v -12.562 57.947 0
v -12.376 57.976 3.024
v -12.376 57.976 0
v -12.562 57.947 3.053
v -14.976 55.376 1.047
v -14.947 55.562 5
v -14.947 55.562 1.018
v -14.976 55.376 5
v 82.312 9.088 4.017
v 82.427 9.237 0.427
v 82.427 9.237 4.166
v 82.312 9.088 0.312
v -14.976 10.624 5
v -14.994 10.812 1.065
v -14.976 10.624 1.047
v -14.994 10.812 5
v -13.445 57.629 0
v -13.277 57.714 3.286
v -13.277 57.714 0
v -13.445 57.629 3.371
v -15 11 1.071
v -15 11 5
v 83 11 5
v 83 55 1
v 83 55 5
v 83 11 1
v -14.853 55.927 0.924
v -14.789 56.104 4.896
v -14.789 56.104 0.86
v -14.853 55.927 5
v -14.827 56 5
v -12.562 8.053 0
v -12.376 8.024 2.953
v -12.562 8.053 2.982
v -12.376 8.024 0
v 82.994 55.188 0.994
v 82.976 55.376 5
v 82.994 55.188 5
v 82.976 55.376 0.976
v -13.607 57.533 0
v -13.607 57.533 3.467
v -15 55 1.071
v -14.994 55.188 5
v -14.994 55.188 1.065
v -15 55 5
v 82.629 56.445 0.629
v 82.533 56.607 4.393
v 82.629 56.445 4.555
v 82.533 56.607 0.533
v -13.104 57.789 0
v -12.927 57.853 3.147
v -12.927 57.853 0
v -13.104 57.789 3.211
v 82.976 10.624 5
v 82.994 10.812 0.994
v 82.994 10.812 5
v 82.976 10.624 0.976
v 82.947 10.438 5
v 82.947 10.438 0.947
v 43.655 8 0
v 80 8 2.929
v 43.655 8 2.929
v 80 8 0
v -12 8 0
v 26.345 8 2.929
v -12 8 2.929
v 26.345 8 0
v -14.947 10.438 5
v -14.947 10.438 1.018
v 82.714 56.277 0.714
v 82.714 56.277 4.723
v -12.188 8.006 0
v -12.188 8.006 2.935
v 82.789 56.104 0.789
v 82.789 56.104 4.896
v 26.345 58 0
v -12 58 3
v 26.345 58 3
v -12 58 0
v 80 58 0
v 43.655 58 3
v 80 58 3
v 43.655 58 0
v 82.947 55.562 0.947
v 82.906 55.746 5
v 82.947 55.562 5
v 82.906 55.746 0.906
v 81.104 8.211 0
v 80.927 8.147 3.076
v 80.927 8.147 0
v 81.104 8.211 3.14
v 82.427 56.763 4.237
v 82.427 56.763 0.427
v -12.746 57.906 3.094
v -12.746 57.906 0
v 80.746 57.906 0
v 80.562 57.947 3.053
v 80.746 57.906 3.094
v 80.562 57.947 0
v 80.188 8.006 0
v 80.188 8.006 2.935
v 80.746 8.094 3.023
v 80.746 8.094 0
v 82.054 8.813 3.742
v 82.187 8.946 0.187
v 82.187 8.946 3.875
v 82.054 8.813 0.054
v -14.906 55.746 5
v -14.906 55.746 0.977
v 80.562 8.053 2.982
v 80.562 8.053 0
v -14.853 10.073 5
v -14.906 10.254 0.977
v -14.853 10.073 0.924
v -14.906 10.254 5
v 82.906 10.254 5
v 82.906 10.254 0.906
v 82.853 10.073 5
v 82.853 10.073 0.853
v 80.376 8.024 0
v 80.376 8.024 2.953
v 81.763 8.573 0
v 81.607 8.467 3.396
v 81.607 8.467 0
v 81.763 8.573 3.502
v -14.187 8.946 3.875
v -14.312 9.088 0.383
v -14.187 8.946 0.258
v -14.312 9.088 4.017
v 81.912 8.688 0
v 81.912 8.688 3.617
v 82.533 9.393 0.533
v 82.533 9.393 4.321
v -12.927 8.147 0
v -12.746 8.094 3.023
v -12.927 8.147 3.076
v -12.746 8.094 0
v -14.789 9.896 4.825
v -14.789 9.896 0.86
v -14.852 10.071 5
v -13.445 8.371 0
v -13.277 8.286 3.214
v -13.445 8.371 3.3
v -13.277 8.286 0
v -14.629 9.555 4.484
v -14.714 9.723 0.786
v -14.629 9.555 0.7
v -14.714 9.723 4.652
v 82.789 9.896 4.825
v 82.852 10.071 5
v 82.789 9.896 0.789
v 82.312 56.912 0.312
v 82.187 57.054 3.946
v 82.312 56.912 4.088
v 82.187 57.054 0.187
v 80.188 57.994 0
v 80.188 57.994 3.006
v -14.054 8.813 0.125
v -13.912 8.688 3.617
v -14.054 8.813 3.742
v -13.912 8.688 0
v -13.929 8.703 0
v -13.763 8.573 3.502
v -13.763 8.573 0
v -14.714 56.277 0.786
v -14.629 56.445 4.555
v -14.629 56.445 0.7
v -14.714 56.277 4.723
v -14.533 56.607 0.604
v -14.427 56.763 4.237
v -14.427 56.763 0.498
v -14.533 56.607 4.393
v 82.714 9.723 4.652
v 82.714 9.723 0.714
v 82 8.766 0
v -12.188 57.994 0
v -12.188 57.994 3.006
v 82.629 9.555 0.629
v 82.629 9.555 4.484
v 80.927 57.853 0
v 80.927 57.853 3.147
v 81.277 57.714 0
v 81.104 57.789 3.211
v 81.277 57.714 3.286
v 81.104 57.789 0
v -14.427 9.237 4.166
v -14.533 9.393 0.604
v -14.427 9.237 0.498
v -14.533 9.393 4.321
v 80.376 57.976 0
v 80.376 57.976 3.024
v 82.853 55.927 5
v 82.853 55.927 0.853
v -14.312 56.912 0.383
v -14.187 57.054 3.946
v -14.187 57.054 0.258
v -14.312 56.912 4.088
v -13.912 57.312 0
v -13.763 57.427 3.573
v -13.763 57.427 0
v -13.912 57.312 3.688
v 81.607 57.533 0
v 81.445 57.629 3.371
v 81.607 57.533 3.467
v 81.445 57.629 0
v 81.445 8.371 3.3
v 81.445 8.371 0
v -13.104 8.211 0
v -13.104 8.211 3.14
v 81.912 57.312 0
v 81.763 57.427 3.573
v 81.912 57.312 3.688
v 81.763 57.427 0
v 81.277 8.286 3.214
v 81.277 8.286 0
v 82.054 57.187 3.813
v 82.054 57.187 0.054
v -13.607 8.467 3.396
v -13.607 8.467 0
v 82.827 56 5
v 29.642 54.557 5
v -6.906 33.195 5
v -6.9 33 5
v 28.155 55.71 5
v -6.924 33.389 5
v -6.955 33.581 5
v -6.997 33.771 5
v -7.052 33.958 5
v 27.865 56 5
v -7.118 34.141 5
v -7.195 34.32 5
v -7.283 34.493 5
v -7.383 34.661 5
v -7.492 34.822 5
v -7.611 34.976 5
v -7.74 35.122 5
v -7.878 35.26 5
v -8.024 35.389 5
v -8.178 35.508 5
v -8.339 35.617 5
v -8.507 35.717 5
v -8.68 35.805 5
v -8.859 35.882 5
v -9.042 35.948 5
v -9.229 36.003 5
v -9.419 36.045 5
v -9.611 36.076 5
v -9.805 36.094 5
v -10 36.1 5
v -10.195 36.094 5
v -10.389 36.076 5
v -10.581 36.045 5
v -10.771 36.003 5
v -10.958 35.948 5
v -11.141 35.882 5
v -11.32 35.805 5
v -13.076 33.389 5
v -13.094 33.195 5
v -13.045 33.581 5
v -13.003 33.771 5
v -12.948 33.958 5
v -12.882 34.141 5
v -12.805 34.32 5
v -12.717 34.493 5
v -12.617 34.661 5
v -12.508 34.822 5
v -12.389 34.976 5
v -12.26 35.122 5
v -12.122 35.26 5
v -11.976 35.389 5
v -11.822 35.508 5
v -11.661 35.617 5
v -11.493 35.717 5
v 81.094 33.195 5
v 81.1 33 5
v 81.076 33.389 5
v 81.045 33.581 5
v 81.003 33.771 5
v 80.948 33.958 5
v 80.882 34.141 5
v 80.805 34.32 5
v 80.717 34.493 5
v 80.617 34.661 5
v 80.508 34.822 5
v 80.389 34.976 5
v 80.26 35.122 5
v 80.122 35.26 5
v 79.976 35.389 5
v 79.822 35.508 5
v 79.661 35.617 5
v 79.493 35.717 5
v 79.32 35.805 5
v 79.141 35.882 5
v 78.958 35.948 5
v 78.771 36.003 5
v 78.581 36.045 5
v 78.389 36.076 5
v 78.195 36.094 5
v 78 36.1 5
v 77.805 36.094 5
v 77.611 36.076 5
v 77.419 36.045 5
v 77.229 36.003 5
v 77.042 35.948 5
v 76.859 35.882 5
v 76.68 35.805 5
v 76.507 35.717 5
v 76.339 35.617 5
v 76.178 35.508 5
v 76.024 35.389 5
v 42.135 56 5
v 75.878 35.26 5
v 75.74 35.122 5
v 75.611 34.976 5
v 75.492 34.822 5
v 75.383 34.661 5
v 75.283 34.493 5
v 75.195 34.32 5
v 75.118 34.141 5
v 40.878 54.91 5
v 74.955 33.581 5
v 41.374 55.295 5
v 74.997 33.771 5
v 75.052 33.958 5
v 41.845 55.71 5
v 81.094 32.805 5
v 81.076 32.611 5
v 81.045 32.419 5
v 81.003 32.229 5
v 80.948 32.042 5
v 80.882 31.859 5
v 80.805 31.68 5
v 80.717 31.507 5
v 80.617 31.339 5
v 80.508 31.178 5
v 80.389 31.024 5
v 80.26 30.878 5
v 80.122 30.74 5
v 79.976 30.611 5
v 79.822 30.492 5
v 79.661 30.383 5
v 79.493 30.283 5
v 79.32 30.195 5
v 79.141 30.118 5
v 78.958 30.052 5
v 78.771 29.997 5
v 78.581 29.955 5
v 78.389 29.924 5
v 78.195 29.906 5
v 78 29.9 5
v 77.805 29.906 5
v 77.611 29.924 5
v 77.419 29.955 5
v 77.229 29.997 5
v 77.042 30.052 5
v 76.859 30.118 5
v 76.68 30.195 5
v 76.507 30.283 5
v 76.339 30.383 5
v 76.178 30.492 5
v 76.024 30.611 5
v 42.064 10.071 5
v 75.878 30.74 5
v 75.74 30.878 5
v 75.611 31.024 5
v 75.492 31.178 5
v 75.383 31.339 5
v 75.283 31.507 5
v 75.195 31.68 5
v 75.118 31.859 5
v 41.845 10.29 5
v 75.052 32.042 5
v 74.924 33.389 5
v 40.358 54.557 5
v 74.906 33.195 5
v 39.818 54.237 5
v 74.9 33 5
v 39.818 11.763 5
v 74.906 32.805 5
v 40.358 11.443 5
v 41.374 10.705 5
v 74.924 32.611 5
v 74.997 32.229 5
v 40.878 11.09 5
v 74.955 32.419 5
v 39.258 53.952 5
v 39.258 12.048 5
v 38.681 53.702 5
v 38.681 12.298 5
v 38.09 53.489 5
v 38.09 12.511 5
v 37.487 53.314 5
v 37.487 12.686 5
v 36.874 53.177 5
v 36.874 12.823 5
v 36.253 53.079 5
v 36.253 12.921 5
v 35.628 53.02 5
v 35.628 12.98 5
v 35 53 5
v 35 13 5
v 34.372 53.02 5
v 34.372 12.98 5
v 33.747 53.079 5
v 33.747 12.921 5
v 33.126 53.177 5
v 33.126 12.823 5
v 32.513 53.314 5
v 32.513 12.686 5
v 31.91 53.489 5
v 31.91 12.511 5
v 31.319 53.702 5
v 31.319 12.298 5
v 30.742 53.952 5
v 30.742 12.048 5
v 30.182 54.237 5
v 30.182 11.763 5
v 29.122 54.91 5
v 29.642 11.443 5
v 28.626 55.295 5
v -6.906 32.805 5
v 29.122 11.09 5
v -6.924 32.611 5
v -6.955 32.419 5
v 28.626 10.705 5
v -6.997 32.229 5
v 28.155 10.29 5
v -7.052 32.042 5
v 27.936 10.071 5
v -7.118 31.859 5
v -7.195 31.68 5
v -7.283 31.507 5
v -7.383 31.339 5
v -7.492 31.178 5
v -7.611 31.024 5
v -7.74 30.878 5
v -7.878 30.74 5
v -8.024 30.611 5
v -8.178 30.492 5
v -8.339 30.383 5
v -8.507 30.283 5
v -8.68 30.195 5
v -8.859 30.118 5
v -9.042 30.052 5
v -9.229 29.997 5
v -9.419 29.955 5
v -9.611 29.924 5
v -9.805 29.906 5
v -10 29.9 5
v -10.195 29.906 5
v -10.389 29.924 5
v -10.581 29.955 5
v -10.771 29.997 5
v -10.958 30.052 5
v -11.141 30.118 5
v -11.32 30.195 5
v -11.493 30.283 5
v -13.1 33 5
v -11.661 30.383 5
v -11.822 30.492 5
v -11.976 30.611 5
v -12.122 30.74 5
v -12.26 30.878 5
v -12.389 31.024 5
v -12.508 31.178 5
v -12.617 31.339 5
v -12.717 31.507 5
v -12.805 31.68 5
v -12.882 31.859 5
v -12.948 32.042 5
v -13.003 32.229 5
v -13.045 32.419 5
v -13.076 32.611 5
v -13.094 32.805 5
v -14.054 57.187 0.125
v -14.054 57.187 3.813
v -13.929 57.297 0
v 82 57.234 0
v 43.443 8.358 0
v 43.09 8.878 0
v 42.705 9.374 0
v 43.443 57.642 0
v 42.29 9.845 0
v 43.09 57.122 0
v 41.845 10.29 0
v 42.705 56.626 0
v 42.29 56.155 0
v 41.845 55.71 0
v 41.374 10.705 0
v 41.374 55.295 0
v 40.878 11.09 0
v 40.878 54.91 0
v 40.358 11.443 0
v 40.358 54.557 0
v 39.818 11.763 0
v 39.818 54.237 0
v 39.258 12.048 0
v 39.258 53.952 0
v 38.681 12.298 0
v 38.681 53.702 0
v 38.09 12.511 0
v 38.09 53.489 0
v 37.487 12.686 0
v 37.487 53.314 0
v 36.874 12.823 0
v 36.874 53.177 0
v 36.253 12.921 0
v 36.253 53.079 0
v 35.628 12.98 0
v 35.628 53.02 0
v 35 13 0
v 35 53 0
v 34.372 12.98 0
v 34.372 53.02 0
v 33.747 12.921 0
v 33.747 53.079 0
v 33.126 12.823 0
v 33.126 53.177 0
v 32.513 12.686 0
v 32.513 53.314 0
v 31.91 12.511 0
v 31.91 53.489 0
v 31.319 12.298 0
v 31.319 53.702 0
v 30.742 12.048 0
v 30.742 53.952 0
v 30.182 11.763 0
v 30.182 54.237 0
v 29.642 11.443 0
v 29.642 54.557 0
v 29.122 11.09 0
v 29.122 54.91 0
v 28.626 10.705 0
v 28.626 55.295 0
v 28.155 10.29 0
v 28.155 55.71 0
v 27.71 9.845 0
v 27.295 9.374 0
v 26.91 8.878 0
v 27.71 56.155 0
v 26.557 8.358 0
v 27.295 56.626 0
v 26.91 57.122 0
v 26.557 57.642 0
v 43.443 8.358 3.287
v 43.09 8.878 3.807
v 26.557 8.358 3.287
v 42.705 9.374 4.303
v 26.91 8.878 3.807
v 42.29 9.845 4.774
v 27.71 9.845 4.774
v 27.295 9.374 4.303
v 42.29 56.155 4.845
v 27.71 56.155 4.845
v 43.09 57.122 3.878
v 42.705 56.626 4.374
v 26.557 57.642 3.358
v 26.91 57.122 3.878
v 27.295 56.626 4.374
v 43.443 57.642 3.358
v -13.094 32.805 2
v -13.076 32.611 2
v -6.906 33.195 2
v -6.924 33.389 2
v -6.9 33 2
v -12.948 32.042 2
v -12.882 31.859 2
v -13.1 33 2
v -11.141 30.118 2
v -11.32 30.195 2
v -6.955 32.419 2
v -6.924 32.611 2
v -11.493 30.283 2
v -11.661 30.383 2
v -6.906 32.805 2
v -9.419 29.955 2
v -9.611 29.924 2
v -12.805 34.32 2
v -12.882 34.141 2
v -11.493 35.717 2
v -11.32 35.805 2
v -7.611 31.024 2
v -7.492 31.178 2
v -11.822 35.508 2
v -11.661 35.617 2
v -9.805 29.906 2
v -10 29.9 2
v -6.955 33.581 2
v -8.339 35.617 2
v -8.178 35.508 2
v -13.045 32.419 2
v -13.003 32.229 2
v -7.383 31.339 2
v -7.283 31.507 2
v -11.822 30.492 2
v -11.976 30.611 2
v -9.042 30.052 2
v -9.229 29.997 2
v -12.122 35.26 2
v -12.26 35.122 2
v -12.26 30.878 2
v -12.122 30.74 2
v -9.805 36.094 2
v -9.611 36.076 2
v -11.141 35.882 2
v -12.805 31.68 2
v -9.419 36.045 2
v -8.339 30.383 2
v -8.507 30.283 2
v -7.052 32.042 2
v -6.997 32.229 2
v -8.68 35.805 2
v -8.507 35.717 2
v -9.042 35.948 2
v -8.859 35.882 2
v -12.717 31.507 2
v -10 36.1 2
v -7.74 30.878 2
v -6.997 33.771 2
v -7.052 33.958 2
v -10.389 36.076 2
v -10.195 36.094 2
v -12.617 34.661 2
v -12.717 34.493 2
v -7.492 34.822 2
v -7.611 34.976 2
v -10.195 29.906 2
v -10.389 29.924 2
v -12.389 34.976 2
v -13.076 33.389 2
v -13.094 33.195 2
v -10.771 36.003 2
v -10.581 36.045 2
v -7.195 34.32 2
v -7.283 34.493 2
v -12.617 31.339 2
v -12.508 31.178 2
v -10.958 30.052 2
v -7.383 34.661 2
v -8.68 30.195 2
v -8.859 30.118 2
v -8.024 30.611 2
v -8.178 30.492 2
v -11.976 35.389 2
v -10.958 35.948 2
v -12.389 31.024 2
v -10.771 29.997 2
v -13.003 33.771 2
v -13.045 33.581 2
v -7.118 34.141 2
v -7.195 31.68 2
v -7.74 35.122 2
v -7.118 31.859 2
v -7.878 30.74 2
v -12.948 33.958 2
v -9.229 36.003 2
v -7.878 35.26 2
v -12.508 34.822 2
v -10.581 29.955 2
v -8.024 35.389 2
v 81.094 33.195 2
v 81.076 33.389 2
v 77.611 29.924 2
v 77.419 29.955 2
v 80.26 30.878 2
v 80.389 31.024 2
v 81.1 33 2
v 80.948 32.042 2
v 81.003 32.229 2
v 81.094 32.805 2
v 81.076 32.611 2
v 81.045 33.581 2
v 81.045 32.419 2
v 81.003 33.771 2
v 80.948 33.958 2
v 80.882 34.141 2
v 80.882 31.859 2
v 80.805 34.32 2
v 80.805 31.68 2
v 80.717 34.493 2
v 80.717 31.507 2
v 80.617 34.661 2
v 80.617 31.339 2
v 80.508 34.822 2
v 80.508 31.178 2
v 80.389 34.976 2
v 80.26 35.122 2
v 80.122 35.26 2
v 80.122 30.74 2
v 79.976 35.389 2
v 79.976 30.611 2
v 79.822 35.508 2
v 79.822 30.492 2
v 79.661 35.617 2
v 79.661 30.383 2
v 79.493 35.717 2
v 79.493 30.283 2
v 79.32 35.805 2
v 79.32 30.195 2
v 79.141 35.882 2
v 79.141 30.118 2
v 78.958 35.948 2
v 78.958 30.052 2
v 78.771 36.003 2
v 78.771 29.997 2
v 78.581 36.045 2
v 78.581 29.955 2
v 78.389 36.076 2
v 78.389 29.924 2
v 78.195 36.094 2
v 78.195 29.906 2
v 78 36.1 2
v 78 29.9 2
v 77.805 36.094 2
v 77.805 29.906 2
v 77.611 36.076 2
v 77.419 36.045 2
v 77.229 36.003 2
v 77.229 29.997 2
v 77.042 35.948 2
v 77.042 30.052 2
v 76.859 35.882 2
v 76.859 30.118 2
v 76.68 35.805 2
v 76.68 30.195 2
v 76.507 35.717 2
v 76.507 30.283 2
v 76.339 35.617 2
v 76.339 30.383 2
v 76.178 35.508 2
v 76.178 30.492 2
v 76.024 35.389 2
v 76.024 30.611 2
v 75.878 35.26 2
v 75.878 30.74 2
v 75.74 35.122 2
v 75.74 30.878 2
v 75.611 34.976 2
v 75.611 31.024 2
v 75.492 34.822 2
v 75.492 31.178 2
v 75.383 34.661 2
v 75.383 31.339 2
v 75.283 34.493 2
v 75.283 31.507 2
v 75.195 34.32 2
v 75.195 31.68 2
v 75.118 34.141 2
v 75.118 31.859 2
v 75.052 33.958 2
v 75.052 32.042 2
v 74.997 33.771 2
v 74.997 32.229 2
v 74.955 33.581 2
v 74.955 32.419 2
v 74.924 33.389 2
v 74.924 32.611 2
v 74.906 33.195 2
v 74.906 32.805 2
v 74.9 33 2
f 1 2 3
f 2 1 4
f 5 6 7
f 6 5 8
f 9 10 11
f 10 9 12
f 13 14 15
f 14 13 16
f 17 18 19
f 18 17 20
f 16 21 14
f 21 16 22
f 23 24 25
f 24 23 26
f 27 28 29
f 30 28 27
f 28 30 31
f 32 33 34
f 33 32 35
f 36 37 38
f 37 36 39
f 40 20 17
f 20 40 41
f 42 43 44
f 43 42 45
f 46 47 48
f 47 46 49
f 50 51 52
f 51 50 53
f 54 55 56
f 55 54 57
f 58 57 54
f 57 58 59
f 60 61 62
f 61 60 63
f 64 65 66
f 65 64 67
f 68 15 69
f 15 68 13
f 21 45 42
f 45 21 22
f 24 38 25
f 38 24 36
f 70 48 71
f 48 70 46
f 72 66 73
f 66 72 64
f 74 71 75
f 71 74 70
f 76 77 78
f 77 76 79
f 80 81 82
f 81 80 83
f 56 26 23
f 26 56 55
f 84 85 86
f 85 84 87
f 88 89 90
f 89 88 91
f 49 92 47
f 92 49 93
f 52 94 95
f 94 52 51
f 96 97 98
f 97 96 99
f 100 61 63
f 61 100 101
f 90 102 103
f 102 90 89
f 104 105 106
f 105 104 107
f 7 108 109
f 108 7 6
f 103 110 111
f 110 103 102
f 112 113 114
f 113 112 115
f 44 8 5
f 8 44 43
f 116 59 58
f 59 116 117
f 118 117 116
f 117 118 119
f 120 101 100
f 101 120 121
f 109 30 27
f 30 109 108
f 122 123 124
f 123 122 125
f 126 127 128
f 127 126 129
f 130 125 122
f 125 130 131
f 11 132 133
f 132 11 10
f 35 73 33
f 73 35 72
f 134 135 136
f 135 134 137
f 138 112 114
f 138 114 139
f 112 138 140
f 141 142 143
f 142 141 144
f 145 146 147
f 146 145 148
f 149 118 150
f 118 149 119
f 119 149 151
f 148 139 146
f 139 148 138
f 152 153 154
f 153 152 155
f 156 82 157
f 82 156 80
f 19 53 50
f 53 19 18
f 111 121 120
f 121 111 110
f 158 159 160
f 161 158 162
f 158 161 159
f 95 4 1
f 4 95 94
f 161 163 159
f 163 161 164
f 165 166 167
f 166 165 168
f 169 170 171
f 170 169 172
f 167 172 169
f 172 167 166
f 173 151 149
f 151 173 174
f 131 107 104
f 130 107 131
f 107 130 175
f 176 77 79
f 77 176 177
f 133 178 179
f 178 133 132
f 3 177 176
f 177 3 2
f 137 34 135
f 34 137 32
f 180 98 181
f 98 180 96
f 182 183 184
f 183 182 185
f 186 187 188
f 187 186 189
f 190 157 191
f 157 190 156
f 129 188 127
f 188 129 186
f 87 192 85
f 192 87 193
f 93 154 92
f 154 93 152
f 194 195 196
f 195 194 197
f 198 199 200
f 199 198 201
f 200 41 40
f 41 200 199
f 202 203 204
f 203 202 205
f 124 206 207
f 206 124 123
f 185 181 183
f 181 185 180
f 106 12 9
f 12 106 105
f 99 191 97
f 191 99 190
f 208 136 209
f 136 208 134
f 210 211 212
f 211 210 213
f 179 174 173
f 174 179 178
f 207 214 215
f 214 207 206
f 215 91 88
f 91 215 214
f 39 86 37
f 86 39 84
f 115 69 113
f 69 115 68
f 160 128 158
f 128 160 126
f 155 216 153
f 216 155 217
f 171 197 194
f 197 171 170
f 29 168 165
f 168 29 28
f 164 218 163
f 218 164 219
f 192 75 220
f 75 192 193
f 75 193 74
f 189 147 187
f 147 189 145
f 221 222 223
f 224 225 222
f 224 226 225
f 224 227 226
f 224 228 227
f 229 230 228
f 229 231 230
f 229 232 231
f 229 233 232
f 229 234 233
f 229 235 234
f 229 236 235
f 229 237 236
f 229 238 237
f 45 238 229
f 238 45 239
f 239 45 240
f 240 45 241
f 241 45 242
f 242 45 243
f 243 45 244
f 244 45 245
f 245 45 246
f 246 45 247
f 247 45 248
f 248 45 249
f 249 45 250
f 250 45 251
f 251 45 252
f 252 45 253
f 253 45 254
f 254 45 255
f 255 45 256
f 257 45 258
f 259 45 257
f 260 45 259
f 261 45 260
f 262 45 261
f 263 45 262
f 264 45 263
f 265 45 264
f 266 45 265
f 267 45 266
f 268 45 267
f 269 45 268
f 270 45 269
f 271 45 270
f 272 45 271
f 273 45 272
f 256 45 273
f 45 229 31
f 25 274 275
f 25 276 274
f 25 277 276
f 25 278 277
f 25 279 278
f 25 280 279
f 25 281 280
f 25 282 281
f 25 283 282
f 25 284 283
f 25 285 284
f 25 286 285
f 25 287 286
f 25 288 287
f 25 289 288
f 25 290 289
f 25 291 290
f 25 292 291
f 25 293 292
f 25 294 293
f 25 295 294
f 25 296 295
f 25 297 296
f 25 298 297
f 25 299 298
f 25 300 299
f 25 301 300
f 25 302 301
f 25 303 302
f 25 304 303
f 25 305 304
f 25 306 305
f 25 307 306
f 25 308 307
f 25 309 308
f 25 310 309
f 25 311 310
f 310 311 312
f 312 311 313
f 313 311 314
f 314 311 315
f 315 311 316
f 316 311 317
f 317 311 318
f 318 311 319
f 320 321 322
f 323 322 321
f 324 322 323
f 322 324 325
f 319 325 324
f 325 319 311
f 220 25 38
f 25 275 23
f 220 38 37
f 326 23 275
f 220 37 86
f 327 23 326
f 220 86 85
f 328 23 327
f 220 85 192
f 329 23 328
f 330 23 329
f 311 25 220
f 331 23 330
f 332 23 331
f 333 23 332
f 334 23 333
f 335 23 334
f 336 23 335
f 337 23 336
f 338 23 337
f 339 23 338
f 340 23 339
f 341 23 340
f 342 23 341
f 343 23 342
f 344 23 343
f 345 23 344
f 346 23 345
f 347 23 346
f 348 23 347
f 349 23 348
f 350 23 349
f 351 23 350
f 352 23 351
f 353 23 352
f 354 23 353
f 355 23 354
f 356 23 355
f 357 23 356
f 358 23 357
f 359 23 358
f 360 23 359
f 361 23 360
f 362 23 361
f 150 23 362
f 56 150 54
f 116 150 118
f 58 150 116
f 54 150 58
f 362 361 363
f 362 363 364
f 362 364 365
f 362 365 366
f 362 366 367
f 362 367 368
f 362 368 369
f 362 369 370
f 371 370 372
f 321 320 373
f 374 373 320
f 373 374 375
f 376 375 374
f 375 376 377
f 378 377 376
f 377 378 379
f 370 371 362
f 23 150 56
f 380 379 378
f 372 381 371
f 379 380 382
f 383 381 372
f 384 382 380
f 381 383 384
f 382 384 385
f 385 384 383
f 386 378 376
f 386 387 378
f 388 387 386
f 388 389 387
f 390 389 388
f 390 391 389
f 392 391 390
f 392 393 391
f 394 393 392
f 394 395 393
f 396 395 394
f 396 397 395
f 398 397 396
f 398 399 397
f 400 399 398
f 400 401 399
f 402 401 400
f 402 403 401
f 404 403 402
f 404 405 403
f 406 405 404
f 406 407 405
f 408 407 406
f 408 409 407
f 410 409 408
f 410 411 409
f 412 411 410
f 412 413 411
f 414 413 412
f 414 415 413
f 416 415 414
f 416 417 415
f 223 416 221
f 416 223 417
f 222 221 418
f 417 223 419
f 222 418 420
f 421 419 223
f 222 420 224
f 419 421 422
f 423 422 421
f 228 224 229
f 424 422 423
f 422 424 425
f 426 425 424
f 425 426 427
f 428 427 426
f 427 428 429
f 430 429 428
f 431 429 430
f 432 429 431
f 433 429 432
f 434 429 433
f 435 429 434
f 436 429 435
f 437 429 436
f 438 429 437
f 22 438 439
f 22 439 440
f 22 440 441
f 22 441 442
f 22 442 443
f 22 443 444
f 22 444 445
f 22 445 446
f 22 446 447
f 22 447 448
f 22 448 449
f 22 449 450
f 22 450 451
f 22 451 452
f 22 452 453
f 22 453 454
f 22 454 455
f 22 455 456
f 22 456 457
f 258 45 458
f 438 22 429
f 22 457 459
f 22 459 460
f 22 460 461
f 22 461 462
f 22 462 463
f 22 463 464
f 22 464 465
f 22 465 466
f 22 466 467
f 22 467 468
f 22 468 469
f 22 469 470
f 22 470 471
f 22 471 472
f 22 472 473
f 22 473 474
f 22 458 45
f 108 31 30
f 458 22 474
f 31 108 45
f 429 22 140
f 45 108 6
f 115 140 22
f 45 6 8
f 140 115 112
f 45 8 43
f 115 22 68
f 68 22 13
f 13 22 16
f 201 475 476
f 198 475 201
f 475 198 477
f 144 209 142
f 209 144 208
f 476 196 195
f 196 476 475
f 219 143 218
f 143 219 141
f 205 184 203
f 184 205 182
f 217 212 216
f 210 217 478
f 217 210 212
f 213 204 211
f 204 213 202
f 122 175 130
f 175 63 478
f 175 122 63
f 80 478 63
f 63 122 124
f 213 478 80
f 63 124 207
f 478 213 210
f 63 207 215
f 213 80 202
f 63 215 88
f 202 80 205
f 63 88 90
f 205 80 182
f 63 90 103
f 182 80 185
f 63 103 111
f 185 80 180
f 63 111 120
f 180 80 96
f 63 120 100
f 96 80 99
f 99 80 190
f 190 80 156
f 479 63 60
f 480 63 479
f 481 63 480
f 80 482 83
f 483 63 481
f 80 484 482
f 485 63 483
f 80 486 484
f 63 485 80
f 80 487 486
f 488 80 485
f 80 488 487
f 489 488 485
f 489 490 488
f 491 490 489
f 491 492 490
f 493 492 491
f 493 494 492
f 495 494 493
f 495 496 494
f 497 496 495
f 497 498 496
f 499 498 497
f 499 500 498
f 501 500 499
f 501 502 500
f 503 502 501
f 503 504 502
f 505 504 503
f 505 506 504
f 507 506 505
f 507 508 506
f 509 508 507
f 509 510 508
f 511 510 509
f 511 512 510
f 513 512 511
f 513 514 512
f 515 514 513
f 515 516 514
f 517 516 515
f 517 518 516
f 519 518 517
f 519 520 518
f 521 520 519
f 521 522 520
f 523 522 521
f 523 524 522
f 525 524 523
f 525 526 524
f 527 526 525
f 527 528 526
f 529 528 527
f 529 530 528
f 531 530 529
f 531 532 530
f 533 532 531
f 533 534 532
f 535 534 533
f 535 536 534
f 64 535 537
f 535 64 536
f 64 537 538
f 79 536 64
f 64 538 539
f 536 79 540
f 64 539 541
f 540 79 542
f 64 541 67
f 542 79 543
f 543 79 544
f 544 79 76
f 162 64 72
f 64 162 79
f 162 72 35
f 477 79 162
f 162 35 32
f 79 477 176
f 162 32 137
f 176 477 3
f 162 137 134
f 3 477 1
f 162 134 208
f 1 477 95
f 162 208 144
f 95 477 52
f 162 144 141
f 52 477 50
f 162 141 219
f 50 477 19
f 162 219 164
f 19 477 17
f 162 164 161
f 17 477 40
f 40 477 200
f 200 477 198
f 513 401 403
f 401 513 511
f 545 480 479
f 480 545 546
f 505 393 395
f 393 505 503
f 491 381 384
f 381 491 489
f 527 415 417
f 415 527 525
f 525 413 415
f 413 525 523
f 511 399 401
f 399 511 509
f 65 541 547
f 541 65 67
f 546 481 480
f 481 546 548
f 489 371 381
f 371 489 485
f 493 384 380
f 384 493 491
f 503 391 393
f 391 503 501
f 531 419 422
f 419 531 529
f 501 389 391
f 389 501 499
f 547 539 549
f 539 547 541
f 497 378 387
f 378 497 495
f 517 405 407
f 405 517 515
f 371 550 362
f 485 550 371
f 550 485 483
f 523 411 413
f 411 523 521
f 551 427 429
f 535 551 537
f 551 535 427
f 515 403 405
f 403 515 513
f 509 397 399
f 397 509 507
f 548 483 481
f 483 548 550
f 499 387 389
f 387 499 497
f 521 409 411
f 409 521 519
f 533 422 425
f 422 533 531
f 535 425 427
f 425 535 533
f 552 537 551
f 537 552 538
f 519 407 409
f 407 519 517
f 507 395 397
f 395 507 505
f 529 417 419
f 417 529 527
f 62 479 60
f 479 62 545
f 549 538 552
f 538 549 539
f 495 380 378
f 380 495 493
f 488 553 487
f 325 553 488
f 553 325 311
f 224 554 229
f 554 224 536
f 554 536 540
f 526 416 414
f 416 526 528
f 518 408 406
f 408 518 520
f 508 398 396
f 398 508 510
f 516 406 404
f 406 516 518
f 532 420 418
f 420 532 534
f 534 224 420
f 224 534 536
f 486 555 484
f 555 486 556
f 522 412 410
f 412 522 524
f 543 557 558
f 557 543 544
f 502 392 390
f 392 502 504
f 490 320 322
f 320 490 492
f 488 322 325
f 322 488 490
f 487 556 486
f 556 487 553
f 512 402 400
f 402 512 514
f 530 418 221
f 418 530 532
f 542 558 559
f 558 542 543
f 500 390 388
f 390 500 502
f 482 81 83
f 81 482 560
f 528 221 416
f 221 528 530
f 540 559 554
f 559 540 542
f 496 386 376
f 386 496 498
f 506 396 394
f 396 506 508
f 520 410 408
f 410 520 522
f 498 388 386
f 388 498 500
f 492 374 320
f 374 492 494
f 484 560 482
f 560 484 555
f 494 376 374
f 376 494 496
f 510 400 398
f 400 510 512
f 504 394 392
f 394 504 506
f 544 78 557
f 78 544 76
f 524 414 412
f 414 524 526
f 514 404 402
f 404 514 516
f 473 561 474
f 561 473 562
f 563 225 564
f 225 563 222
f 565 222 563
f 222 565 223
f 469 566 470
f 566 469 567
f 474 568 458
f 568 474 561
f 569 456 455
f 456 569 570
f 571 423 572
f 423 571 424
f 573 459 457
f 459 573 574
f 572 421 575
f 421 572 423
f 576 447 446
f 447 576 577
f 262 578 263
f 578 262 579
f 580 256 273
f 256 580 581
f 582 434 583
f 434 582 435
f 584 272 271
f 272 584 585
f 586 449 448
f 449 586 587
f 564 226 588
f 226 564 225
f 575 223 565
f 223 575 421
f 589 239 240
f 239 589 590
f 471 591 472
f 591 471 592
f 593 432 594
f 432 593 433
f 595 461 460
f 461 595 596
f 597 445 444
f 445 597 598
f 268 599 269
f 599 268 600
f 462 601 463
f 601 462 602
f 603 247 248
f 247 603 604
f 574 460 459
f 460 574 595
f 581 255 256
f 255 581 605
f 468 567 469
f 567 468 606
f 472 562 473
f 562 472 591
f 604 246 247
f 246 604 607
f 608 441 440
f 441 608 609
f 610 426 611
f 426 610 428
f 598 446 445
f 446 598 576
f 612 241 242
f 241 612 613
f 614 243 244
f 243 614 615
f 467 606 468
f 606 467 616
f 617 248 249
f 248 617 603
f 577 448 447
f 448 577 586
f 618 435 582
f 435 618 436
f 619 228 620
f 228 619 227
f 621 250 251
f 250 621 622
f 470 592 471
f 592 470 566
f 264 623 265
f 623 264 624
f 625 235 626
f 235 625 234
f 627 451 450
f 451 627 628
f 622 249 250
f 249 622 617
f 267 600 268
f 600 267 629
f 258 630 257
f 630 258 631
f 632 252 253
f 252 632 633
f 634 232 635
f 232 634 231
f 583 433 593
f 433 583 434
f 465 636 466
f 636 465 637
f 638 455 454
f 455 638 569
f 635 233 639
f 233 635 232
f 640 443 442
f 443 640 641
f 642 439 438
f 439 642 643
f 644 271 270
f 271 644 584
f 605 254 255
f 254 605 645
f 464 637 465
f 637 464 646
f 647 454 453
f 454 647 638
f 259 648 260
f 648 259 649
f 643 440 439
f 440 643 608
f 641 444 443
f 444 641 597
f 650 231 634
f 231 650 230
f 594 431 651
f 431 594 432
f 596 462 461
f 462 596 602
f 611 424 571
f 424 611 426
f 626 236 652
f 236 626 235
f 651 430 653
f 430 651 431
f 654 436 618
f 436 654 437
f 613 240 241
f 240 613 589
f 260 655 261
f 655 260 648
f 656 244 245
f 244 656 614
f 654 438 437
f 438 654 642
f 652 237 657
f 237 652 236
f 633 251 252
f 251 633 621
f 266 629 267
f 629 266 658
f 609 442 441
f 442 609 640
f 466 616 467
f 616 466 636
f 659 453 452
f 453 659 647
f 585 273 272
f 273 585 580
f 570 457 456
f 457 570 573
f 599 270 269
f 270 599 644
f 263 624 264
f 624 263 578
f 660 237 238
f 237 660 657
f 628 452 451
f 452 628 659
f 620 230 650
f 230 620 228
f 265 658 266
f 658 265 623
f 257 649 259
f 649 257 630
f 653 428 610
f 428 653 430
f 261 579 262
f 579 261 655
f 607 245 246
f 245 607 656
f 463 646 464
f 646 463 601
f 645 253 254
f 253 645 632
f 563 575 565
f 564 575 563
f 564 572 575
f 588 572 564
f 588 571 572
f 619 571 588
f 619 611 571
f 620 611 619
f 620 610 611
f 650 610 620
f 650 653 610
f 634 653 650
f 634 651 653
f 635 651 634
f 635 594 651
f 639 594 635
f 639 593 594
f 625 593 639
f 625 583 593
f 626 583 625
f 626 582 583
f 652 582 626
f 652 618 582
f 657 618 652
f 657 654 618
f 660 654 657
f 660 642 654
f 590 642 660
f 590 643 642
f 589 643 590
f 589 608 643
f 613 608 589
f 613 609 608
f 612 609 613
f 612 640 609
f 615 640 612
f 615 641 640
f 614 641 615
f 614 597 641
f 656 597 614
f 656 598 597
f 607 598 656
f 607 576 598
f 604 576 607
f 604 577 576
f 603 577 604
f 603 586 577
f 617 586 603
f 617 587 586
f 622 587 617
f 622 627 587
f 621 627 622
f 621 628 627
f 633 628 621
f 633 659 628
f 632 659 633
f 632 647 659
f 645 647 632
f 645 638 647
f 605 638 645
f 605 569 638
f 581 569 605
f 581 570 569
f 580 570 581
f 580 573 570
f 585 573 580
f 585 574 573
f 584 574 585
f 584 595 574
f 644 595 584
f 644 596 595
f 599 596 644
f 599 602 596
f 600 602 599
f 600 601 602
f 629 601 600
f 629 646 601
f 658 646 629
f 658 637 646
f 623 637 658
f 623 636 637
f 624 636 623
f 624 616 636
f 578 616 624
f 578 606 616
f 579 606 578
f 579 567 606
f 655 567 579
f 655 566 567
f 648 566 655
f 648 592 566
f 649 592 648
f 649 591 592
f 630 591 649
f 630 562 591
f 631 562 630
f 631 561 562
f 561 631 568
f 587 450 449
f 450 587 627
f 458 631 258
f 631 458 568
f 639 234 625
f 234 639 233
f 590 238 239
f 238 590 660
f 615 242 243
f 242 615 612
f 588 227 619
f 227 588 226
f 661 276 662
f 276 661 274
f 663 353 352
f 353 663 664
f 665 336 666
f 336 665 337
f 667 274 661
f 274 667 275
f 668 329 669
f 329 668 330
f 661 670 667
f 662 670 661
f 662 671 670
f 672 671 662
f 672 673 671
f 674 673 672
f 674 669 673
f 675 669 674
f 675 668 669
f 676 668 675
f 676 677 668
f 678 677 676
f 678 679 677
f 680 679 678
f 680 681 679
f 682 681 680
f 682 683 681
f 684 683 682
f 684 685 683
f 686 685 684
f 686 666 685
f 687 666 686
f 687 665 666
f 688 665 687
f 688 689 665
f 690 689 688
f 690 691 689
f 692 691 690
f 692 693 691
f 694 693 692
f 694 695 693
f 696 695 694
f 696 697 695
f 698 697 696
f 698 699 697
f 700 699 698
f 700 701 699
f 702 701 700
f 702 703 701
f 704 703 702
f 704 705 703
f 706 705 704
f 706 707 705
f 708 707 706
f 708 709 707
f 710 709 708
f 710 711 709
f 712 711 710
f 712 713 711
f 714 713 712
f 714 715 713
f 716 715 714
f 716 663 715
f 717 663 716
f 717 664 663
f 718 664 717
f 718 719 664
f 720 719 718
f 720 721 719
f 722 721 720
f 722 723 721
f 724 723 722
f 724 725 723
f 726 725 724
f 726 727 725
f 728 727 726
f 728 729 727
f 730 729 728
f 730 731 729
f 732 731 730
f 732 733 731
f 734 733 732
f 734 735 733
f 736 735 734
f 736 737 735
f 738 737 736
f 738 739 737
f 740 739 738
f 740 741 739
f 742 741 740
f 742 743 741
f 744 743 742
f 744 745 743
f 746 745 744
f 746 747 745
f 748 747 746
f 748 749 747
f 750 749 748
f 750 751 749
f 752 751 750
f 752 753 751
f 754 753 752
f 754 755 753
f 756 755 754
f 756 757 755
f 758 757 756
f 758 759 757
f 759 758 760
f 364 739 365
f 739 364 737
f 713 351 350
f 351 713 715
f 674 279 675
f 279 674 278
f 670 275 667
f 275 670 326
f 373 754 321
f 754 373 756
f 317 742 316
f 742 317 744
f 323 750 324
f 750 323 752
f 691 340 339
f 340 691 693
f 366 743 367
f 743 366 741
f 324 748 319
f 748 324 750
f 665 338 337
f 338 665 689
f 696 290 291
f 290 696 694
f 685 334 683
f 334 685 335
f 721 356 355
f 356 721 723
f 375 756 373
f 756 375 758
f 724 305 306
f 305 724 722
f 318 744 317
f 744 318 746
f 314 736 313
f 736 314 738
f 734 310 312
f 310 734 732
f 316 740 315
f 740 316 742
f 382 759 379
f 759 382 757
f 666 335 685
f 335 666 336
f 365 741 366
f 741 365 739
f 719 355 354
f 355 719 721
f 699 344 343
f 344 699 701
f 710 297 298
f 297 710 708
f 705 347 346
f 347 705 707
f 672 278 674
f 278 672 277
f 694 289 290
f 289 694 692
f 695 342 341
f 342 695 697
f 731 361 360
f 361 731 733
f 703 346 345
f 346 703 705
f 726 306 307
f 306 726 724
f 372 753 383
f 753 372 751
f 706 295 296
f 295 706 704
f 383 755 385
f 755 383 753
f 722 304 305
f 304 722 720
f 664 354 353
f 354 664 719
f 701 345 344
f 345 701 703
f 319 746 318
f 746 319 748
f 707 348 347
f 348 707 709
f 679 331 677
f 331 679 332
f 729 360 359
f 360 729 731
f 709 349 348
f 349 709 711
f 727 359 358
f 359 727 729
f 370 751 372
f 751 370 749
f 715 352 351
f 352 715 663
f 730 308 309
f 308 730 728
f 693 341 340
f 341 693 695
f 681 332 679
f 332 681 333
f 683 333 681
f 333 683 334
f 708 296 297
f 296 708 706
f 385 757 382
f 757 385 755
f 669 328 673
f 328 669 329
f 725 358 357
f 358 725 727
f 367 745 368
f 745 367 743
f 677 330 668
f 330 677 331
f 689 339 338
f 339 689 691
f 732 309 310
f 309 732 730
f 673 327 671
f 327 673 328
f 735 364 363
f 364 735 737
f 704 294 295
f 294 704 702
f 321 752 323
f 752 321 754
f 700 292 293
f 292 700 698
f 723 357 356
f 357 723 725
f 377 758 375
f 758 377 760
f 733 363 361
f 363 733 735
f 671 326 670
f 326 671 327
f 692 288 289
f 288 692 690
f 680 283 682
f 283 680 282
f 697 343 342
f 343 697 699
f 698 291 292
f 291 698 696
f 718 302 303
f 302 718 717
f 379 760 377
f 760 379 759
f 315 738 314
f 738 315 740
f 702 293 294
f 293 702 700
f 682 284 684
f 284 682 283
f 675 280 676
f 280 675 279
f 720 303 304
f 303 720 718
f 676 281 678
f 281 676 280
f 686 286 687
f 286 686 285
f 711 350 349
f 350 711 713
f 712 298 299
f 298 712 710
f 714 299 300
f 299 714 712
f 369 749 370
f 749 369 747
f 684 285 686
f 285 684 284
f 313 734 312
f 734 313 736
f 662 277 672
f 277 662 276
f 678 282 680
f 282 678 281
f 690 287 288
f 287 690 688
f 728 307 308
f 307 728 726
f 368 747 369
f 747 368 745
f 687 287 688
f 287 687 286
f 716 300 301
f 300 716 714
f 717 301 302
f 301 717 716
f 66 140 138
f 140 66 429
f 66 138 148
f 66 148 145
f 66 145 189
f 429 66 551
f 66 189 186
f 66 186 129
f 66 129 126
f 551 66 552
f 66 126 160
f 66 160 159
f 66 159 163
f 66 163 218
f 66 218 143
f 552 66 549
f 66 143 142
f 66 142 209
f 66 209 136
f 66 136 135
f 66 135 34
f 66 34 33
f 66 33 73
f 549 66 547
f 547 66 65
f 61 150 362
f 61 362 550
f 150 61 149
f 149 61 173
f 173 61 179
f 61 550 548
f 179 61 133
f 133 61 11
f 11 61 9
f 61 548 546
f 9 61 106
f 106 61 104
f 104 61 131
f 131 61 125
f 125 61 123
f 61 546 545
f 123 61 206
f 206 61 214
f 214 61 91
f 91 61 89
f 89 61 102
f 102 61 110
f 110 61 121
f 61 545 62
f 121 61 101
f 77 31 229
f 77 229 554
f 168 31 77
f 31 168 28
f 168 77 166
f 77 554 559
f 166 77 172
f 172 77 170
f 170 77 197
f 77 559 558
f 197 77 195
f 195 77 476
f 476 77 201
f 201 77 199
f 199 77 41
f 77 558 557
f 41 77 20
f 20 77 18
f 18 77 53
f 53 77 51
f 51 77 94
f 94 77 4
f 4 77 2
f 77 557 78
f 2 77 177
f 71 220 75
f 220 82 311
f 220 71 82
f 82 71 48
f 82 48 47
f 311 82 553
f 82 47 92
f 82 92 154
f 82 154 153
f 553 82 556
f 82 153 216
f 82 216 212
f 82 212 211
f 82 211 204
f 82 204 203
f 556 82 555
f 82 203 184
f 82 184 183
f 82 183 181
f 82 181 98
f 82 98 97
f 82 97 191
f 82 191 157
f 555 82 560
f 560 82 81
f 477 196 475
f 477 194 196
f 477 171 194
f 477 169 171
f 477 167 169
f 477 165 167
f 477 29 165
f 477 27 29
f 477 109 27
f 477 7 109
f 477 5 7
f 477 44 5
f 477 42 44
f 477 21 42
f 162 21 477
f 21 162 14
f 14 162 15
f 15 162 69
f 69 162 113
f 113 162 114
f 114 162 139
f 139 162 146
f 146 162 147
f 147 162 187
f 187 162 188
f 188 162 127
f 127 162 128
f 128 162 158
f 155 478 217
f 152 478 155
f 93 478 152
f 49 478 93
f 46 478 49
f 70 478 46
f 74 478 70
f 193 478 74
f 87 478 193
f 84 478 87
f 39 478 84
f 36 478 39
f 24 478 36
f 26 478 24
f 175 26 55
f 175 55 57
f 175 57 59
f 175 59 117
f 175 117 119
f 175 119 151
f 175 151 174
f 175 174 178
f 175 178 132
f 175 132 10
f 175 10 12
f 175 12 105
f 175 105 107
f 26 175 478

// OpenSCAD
difference() {
    //lid( 実際は 5 mm厚 )
    translate([-13,0,0]) linear_extrude(5) hull() {
        translate([1,11,0]) circle(3,$fn=100);
        translate([93,11,0]) circle(3,$fn=100);
        translate([1,55,0]) circle(3,$fn=100);
        translate([93,55,0]) circle(3,$fn=100);
    }
    // 指かけ
    translate([35,3,0]) linear_extrude(10) circle(10,$fn=100);
    translate([35,63,0]) linear_extrude(10) circle(10,$fn=100);
    //磁石
    translate([-10,33,2]) linear_extrude(4) circle(3.1,$fn=100);
    translate([78,33,2]) linear_extrude(4) circle(3.1,$fn=100);
    //蓋縁
    #translate([-16,4,6]) rotate([0,0,90]) rotate([0,45,0]) rotate([90,0,0]) linear_extrude(100) square([5,5]);
    #translate([-16,55,6]) rotate([0,0,90])  rotate([0,45,0]) rotate([90,0,0]) linear_extrude(100) square([5,5]);
    //剥し
    #translate([-19,85,-2]) rotate([0,45,0]) rotate([90,0,0]) linear_extrude(100) square([5,5]);
    #translate([80,85,-2]) rotate([0,45,0]) rotate([90,0,0]) linear_extrude(100) square([5,5]);
}
